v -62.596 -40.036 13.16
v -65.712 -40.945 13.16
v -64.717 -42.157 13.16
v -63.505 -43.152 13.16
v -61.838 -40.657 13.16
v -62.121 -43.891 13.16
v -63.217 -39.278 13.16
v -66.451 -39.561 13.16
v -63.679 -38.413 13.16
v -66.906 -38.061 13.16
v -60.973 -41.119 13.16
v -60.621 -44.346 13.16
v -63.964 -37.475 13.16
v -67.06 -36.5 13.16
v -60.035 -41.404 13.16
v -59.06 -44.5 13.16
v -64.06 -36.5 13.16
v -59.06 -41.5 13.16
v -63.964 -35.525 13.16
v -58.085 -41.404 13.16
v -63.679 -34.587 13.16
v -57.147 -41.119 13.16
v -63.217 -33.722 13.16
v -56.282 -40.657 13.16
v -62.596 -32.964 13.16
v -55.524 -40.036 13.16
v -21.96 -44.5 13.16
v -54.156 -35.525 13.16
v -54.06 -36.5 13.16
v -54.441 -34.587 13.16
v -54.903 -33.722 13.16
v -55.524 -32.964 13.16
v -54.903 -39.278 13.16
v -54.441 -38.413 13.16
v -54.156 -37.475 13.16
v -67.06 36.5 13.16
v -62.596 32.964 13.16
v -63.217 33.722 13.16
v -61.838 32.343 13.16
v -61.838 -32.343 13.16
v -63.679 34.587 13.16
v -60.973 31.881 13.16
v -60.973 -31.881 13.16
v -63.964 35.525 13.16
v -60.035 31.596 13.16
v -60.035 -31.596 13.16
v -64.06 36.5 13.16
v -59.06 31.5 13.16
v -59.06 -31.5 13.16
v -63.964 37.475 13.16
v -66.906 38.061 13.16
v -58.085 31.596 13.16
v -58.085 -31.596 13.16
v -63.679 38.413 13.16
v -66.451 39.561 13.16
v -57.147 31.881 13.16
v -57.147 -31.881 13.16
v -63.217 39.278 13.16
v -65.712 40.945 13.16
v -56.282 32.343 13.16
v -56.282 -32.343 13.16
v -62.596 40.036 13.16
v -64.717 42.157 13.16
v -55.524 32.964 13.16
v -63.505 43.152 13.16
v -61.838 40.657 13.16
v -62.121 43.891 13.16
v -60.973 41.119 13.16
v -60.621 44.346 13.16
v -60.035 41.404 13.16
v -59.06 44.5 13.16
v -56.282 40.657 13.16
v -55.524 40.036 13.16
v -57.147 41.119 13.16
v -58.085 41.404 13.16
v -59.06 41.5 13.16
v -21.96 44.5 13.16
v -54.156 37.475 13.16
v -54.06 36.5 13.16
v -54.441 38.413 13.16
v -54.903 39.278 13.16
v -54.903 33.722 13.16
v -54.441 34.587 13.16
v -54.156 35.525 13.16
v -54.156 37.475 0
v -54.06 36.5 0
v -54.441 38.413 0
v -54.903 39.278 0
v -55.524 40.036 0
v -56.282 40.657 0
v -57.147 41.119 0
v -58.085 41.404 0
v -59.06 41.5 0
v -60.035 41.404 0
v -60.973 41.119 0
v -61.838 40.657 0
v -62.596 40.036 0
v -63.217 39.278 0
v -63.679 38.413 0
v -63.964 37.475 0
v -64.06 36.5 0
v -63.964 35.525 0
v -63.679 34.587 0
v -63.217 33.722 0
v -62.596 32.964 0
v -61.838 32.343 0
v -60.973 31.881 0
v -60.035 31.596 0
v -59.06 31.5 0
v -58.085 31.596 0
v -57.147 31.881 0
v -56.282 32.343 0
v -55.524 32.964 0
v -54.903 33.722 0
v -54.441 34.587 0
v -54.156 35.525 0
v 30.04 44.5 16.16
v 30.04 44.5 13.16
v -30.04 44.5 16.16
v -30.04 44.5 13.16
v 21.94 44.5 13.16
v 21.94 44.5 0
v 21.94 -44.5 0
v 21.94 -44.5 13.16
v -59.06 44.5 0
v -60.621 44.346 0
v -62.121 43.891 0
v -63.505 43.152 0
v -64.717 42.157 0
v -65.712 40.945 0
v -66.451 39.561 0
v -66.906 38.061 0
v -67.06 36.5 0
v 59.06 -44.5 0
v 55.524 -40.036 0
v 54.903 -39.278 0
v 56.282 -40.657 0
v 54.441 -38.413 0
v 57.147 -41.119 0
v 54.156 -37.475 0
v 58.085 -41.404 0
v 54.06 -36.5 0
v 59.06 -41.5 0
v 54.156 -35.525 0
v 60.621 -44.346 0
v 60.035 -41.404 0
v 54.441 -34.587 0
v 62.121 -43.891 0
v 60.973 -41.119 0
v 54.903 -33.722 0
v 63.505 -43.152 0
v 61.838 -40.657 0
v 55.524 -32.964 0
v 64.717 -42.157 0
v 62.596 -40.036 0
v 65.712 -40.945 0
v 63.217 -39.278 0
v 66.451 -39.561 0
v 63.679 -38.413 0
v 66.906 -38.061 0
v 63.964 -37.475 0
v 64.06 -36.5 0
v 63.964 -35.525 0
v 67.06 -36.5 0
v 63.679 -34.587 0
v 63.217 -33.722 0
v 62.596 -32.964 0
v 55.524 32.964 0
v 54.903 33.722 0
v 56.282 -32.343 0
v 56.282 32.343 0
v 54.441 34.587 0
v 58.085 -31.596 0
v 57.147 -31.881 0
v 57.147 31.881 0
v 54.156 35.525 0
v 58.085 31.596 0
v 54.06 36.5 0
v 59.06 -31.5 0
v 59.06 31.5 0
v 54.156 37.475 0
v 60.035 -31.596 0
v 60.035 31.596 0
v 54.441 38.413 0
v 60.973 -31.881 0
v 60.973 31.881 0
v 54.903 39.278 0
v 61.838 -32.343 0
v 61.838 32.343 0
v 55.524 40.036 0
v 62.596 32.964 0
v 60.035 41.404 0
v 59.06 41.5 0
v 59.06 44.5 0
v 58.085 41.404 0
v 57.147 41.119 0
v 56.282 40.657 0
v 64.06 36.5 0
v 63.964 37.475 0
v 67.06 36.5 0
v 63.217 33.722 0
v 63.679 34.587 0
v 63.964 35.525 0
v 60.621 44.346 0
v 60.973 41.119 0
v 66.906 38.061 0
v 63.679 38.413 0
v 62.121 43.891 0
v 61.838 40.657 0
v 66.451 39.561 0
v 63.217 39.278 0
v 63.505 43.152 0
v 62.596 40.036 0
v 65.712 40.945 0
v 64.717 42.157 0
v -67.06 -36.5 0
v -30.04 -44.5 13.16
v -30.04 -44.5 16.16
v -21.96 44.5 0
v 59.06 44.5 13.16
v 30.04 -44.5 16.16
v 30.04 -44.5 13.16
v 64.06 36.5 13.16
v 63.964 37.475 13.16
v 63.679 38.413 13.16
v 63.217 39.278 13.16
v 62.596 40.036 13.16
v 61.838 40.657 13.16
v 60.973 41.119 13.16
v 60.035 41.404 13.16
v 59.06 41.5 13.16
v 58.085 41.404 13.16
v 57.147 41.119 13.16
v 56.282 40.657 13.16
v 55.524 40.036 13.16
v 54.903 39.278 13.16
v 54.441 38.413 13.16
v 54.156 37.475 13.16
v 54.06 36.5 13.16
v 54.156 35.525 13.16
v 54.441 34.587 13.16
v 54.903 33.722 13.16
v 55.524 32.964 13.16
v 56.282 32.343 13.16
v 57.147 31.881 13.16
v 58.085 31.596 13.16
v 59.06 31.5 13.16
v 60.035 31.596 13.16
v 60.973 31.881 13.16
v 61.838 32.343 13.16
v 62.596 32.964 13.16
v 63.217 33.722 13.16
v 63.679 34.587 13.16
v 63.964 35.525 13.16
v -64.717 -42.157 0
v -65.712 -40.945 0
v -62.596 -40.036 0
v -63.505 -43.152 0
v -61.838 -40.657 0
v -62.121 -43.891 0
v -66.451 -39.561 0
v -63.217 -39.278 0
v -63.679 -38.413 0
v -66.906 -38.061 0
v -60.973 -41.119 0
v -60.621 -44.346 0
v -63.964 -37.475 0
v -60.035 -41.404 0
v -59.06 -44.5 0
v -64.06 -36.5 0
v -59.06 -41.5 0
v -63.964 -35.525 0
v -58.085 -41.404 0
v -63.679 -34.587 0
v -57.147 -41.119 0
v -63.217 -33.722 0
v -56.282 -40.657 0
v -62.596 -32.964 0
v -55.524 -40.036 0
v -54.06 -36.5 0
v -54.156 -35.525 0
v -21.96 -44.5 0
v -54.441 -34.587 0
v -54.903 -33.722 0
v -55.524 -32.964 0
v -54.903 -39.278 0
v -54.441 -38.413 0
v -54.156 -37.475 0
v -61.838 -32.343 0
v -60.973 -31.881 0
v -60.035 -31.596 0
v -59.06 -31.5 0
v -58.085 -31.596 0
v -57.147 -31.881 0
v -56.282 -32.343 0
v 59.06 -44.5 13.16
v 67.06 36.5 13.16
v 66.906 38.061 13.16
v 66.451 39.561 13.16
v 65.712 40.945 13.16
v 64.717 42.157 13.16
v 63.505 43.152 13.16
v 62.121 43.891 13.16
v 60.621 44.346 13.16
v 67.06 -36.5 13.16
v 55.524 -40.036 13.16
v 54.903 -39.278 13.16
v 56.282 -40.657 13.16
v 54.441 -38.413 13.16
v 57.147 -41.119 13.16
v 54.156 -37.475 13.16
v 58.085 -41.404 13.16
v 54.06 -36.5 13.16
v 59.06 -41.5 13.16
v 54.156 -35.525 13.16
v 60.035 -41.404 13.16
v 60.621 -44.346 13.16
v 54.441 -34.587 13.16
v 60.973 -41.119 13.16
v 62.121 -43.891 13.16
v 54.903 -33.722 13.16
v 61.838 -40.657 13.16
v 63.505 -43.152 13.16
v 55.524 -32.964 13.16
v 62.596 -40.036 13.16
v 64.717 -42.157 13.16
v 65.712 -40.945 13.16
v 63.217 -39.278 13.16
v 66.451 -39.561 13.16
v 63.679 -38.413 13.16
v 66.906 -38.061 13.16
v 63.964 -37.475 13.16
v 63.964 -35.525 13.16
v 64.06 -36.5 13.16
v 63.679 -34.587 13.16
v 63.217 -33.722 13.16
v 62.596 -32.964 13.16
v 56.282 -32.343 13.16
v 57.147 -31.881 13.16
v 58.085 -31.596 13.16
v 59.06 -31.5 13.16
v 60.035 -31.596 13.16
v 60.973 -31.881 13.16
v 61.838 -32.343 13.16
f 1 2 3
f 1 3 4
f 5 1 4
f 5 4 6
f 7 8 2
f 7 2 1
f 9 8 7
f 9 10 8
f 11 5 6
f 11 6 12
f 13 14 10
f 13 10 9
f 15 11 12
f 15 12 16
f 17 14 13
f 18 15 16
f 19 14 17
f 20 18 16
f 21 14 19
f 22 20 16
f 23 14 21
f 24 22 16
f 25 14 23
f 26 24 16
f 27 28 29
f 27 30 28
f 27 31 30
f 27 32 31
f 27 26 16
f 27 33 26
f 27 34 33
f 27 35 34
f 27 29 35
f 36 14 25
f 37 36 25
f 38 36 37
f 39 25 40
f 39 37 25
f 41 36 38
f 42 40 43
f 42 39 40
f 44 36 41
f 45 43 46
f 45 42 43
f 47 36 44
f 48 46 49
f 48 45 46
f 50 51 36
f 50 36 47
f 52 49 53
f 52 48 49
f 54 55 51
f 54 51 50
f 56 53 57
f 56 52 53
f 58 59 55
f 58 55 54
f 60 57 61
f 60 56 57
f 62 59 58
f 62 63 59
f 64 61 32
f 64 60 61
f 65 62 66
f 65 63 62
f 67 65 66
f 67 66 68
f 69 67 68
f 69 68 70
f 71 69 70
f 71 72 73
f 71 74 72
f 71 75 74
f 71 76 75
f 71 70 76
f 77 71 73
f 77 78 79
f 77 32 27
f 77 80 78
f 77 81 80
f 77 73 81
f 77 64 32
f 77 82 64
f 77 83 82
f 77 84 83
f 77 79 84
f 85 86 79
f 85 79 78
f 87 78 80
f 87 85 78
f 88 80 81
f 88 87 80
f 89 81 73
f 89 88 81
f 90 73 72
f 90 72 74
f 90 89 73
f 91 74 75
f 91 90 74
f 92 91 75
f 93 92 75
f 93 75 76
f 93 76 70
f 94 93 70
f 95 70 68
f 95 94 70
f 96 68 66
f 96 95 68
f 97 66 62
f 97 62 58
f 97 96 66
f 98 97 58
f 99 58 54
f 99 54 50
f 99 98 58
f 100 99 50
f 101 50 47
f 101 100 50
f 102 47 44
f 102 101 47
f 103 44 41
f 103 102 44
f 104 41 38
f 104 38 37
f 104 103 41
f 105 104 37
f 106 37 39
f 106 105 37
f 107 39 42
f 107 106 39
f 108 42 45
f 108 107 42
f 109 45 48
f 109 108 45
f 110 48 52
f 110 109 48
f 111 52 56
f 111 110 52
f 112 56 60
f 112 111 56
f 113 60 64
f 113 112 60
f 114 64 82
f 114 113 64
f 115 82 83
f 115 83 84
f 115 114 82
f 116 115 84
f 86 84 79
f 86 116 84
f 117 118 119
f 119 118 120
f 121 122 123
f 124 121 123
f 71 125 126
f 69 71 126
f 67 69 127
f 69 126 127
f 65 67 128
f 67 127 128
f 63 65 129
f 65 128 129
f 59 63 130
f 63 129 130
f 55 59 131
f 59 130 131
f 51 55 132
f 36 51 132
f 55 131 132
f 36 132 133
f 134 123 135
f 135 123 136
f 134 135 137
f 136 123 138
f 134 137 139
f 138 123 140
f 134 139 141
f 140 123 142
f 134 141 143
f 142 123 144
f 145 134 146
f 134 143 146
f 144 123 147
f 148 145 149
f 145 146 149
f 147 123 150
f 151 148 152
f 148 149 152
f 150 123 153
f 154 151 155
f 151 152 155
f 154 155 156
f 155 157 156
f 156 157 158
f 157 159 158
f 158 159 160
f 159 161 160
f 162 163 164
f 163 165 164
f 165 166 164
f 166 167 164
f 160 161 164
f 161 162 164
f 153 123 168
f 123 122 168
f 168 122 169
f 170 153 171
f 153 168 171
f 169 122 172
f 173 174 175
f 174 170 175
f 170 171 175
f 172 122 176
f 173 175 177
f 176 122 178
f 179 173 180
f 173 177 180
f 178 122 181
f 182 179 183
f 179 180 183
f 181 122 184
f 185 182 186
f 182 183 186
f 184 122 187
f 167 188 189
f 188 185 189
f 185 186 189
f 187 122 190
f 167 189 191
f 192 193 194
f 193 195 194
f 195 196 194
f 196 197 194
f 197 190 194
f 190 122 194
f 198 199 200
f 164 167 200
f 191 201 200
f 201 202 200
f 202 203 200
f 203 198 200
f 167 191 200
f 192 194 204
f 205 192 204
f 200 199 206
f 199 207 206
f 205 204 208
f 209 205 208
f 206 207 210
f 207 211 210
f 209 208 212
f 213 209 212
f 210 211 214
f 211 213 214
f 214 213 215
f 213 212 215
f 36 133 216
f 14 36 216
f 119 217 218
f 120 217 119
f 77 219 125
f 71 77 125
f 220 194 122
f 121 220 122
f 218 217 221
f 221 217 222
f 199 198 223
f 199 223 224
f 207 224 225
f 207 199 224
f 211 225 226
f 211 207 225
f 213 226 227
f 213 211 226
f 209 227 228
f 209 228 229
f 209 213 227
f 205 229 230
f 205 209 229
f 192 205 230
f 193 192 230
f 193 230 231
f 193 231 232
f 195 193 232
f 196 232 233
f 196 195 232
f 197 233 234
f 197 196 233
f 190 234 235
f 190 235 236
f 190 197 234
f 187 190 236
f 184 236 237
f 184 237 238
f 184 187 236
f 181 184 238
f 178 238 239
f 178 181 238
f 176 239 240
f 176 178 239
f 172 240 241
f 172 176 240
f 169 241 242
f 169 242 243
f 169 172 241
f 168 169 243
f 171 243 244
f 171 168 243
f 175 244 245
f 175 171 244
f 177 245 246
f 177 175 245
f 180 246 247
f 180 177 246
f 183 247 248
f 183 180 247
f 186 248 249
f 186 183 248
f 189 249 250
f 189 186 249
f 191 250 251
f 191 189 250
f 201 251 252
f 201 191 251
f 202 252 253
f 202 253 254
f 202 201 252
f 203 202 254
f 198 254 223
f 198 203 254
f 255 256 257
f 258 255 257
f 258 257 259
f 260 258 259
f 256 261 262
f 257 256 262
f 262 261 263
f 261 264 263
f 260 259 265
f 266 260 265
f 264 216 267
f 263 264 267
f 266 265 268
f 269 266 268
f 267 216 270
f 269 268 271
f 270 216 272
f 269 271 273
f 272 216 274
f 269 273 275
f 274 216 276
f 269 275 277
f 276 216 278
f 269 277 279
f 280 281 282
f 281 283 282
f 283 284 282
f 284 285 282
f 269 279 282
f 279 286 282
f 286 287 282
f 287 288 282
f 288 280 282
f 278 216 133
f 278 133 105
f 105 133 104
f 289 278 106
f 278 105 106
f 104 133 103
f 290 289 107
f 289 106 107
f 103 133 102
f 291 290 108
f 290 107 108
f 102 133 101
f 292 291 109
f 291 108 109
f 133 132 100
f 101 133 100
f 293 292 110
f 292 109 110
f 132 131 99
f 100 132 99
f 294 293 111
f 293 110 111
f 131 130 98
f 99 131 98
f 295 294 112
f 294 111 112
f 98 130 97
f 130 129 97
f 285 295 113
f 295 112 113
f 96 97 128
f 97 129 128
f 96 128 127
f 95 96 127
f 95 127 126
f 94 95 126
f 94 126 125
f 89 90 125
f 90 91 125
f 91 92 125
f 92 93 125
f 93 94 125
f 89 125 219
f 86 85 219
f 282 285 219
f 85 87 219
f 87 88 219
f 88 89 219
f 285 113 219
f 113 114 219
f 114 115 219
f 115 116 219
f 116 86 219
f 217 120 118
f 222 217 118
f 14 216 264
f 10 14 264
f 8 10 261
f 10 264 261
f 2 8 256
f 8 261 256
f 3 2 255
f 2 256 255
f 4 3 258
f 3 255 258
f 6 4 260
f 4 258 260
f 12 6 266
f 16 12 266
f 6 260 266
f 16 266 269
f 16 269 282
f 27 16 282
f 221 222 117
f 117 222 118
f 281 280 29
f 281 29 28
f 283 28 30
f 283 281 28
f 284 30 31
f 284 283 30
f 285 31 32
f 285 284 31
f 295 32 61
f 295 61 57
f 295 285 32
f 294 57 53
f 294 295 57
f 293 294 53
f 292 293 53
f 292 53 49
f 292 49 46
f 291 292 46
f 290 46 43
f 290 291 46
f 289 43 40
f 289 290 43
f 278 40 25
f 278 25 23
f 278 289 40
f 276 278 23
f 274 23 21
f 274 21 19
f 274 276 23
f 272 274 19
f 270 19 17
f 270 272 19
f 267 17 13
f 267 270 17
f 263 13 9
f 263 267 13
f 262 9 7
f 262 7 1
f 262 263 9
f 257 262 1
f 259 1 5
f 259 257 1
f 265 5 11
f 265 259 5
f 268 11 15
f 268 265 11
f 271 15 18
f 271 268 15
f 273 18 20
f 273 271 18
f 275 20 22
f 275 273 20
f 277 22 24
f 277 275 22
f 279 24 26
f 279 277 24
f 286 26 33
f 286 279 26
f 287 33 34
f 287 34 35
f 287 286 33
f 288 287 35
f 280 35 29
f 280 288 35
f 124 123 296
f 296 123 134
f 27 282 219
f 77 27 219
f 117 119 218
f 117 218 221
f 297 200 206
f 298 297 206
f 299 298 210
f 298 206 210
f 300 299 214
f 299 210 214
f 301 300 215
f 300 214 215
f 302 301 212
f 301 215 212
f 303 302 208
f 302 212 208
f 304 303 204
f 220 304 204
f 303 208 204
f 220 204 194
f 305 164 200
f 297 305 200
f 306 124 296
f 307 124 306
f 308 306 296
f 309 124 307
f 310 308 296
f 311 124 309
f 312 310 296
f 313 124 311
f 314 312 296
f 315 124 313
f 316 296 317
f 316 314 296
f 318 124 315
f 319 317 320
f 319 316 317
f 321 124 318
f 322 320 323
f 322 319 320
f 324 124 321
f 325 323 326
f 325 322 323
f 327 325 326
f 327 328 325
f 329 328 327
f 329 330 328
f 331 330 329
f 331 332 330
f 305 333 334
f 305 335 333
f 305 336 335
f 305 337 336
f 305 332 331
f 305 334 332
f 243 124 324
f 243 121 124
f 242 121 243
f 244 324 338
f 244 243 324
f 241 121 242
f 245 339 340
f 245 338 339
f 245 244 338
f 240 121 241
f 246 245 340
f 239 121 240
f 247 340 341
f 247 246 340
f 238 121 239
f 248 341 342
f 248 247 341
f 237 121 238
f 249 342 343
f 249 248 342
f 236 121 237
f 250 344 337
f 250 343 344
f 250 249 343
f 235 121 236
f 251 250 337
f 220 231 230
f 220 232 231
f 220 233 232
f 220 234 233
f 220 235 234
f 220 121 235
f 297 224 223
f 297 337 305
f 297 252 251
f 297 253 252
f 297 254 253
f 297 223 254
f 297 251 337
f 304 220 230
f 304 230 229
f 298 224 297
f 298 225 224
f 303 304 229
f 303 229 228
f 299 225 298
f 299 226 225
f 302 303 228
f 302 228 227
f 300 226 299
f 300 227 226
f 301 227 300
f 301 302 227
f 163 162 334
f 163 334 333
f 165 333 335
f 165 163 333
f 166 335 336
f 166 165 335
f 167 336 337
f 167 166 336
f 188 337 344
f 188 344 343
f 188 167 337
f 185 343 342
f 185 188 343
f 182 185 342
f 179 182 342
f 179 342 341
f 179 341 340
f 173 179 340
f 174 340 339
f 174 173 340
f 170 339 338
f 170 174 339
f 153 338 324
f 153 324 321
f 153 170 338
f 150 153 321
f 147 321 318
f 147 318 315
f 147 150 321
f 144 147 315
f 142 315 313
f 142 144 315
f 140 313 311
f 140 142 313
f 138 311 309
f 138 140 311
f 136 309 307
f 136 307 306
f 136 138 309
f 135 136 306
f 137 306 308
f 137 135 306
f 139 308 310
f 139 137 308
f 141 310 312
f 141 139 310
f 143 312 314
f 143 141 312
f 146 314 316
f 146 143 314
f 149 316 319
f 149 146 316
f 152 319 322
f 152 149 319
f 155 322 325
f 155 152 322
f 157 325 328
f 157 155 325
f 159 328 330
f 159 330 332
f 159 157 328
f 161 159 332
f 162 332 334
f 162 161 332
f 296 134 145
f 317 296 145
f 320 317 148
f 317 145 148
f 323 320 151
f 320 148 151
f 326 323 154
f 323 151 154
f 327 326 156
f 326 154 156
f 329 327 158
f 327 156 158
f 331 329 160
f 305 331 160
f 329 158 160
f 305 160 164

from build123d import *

# Parameters (mm, degrees)
F0_R     = 5
F1_DEPTH = 13.16
F2_W     = 8.08
F2_H     = 89
F3_DEPTH = 3
F4_DEPTH = 170


# Not quite as in the source:
# - an extrude ends at something that could not be found from the text; its depth is read off the source's solid


with BuildPart() as f1:
    # F0 (on Top) → F1 (new body)
    with BuildSketch(Plane.XY):
        with BuildLine():
            Line((-59.06, -44.5), (-21.96, -44.5))
            Line((-21.96, -44.5), (-21.96, 44.5))
            Line((-21.96, 44.5), (-59.06, 44.5))
            ThreePointArc((-59.06, 44.5), (-64.7168542495, 42.1568542495), (-67.06, 36.5))
            Line((-67.06, 36.5), (-67.06, -36.5))
            ThreePointArc((-67.06, -36.5), (-64.7168542495, -42.1568542495), (-59.06, -44.5))
        make_face()
        with Locations((-59.06, -36.5)):
            Circle(F0_R, mode=Mode.SUBTRACT)
        with Locations((-59.06, 36.5)):
            Circle(F0_R, mode=Mode.SUBTRACT)
    extrude(amount=F1_DEPTH)

    # F0 (on Top) → F4 (cut, through all)
    with BuildSketch(Plane.XY):
        with Locations((59.06, -36.5)):
            Circle(F0_R)
        with Locations((-59.06, -36.5)):
            Circle(F0_R)
        with Locations((-59.06, 36.5)):
            Circle(F0_R)
        with Locations((59.06, 36.5)):
            Circle(F0_R)
    extrude(amount=-F4_DEPTH, mode=Mode.SUBTRACT)


with BuildPart() as f1b:
    # F0 (on Top) → F1, piece 2 (new body)
    with BuildSketch(Plane.XY):
        with BuildLine():
            Line((21.94, -44.5), (59.06, -44.5))
            ThreePointArc((59.06, -44.5), (64.7168542495, -42.1568542495), (67.06, -36.5))
            Line((67.06, -36.5), (67.06, 36.5))
            ThreePointArc((67.06, 36.5), (64.7168542495, 42.1568542495), (59.06, 44.5))
            Line((59.06, 44.5), (21.94, 44.5))
            Line((21.94, 44.5), (21.94, -44.5))
        make_face()
        with Locations((59.06, -36.5)):
            Circle(F0_R, mode=Mode.SUBTRACT)
        with Locations((59.06, 36.5)):
            Circle(F0_R, mode=Mode.SUBTRACT)
    extrude(amount=F1_DEPTH)


with BuildPart() as f3:
    # F2 (on face) → F3 (new body)
    with BuildSketch(Plane.XY.offset(13.16)):
        Polygon((30.04, 44.5), (0, 44.5), (-21.96, 44.5), (-21.96, -44.5), (30.04, -44.5), align=None)
        with Locations((-26, 0)):
            Rectangle(F2_W, F2_H)
    extrude(amount=F3_DEPTH)


solid = Compound([f1.part, f1b.part, f3.part])
